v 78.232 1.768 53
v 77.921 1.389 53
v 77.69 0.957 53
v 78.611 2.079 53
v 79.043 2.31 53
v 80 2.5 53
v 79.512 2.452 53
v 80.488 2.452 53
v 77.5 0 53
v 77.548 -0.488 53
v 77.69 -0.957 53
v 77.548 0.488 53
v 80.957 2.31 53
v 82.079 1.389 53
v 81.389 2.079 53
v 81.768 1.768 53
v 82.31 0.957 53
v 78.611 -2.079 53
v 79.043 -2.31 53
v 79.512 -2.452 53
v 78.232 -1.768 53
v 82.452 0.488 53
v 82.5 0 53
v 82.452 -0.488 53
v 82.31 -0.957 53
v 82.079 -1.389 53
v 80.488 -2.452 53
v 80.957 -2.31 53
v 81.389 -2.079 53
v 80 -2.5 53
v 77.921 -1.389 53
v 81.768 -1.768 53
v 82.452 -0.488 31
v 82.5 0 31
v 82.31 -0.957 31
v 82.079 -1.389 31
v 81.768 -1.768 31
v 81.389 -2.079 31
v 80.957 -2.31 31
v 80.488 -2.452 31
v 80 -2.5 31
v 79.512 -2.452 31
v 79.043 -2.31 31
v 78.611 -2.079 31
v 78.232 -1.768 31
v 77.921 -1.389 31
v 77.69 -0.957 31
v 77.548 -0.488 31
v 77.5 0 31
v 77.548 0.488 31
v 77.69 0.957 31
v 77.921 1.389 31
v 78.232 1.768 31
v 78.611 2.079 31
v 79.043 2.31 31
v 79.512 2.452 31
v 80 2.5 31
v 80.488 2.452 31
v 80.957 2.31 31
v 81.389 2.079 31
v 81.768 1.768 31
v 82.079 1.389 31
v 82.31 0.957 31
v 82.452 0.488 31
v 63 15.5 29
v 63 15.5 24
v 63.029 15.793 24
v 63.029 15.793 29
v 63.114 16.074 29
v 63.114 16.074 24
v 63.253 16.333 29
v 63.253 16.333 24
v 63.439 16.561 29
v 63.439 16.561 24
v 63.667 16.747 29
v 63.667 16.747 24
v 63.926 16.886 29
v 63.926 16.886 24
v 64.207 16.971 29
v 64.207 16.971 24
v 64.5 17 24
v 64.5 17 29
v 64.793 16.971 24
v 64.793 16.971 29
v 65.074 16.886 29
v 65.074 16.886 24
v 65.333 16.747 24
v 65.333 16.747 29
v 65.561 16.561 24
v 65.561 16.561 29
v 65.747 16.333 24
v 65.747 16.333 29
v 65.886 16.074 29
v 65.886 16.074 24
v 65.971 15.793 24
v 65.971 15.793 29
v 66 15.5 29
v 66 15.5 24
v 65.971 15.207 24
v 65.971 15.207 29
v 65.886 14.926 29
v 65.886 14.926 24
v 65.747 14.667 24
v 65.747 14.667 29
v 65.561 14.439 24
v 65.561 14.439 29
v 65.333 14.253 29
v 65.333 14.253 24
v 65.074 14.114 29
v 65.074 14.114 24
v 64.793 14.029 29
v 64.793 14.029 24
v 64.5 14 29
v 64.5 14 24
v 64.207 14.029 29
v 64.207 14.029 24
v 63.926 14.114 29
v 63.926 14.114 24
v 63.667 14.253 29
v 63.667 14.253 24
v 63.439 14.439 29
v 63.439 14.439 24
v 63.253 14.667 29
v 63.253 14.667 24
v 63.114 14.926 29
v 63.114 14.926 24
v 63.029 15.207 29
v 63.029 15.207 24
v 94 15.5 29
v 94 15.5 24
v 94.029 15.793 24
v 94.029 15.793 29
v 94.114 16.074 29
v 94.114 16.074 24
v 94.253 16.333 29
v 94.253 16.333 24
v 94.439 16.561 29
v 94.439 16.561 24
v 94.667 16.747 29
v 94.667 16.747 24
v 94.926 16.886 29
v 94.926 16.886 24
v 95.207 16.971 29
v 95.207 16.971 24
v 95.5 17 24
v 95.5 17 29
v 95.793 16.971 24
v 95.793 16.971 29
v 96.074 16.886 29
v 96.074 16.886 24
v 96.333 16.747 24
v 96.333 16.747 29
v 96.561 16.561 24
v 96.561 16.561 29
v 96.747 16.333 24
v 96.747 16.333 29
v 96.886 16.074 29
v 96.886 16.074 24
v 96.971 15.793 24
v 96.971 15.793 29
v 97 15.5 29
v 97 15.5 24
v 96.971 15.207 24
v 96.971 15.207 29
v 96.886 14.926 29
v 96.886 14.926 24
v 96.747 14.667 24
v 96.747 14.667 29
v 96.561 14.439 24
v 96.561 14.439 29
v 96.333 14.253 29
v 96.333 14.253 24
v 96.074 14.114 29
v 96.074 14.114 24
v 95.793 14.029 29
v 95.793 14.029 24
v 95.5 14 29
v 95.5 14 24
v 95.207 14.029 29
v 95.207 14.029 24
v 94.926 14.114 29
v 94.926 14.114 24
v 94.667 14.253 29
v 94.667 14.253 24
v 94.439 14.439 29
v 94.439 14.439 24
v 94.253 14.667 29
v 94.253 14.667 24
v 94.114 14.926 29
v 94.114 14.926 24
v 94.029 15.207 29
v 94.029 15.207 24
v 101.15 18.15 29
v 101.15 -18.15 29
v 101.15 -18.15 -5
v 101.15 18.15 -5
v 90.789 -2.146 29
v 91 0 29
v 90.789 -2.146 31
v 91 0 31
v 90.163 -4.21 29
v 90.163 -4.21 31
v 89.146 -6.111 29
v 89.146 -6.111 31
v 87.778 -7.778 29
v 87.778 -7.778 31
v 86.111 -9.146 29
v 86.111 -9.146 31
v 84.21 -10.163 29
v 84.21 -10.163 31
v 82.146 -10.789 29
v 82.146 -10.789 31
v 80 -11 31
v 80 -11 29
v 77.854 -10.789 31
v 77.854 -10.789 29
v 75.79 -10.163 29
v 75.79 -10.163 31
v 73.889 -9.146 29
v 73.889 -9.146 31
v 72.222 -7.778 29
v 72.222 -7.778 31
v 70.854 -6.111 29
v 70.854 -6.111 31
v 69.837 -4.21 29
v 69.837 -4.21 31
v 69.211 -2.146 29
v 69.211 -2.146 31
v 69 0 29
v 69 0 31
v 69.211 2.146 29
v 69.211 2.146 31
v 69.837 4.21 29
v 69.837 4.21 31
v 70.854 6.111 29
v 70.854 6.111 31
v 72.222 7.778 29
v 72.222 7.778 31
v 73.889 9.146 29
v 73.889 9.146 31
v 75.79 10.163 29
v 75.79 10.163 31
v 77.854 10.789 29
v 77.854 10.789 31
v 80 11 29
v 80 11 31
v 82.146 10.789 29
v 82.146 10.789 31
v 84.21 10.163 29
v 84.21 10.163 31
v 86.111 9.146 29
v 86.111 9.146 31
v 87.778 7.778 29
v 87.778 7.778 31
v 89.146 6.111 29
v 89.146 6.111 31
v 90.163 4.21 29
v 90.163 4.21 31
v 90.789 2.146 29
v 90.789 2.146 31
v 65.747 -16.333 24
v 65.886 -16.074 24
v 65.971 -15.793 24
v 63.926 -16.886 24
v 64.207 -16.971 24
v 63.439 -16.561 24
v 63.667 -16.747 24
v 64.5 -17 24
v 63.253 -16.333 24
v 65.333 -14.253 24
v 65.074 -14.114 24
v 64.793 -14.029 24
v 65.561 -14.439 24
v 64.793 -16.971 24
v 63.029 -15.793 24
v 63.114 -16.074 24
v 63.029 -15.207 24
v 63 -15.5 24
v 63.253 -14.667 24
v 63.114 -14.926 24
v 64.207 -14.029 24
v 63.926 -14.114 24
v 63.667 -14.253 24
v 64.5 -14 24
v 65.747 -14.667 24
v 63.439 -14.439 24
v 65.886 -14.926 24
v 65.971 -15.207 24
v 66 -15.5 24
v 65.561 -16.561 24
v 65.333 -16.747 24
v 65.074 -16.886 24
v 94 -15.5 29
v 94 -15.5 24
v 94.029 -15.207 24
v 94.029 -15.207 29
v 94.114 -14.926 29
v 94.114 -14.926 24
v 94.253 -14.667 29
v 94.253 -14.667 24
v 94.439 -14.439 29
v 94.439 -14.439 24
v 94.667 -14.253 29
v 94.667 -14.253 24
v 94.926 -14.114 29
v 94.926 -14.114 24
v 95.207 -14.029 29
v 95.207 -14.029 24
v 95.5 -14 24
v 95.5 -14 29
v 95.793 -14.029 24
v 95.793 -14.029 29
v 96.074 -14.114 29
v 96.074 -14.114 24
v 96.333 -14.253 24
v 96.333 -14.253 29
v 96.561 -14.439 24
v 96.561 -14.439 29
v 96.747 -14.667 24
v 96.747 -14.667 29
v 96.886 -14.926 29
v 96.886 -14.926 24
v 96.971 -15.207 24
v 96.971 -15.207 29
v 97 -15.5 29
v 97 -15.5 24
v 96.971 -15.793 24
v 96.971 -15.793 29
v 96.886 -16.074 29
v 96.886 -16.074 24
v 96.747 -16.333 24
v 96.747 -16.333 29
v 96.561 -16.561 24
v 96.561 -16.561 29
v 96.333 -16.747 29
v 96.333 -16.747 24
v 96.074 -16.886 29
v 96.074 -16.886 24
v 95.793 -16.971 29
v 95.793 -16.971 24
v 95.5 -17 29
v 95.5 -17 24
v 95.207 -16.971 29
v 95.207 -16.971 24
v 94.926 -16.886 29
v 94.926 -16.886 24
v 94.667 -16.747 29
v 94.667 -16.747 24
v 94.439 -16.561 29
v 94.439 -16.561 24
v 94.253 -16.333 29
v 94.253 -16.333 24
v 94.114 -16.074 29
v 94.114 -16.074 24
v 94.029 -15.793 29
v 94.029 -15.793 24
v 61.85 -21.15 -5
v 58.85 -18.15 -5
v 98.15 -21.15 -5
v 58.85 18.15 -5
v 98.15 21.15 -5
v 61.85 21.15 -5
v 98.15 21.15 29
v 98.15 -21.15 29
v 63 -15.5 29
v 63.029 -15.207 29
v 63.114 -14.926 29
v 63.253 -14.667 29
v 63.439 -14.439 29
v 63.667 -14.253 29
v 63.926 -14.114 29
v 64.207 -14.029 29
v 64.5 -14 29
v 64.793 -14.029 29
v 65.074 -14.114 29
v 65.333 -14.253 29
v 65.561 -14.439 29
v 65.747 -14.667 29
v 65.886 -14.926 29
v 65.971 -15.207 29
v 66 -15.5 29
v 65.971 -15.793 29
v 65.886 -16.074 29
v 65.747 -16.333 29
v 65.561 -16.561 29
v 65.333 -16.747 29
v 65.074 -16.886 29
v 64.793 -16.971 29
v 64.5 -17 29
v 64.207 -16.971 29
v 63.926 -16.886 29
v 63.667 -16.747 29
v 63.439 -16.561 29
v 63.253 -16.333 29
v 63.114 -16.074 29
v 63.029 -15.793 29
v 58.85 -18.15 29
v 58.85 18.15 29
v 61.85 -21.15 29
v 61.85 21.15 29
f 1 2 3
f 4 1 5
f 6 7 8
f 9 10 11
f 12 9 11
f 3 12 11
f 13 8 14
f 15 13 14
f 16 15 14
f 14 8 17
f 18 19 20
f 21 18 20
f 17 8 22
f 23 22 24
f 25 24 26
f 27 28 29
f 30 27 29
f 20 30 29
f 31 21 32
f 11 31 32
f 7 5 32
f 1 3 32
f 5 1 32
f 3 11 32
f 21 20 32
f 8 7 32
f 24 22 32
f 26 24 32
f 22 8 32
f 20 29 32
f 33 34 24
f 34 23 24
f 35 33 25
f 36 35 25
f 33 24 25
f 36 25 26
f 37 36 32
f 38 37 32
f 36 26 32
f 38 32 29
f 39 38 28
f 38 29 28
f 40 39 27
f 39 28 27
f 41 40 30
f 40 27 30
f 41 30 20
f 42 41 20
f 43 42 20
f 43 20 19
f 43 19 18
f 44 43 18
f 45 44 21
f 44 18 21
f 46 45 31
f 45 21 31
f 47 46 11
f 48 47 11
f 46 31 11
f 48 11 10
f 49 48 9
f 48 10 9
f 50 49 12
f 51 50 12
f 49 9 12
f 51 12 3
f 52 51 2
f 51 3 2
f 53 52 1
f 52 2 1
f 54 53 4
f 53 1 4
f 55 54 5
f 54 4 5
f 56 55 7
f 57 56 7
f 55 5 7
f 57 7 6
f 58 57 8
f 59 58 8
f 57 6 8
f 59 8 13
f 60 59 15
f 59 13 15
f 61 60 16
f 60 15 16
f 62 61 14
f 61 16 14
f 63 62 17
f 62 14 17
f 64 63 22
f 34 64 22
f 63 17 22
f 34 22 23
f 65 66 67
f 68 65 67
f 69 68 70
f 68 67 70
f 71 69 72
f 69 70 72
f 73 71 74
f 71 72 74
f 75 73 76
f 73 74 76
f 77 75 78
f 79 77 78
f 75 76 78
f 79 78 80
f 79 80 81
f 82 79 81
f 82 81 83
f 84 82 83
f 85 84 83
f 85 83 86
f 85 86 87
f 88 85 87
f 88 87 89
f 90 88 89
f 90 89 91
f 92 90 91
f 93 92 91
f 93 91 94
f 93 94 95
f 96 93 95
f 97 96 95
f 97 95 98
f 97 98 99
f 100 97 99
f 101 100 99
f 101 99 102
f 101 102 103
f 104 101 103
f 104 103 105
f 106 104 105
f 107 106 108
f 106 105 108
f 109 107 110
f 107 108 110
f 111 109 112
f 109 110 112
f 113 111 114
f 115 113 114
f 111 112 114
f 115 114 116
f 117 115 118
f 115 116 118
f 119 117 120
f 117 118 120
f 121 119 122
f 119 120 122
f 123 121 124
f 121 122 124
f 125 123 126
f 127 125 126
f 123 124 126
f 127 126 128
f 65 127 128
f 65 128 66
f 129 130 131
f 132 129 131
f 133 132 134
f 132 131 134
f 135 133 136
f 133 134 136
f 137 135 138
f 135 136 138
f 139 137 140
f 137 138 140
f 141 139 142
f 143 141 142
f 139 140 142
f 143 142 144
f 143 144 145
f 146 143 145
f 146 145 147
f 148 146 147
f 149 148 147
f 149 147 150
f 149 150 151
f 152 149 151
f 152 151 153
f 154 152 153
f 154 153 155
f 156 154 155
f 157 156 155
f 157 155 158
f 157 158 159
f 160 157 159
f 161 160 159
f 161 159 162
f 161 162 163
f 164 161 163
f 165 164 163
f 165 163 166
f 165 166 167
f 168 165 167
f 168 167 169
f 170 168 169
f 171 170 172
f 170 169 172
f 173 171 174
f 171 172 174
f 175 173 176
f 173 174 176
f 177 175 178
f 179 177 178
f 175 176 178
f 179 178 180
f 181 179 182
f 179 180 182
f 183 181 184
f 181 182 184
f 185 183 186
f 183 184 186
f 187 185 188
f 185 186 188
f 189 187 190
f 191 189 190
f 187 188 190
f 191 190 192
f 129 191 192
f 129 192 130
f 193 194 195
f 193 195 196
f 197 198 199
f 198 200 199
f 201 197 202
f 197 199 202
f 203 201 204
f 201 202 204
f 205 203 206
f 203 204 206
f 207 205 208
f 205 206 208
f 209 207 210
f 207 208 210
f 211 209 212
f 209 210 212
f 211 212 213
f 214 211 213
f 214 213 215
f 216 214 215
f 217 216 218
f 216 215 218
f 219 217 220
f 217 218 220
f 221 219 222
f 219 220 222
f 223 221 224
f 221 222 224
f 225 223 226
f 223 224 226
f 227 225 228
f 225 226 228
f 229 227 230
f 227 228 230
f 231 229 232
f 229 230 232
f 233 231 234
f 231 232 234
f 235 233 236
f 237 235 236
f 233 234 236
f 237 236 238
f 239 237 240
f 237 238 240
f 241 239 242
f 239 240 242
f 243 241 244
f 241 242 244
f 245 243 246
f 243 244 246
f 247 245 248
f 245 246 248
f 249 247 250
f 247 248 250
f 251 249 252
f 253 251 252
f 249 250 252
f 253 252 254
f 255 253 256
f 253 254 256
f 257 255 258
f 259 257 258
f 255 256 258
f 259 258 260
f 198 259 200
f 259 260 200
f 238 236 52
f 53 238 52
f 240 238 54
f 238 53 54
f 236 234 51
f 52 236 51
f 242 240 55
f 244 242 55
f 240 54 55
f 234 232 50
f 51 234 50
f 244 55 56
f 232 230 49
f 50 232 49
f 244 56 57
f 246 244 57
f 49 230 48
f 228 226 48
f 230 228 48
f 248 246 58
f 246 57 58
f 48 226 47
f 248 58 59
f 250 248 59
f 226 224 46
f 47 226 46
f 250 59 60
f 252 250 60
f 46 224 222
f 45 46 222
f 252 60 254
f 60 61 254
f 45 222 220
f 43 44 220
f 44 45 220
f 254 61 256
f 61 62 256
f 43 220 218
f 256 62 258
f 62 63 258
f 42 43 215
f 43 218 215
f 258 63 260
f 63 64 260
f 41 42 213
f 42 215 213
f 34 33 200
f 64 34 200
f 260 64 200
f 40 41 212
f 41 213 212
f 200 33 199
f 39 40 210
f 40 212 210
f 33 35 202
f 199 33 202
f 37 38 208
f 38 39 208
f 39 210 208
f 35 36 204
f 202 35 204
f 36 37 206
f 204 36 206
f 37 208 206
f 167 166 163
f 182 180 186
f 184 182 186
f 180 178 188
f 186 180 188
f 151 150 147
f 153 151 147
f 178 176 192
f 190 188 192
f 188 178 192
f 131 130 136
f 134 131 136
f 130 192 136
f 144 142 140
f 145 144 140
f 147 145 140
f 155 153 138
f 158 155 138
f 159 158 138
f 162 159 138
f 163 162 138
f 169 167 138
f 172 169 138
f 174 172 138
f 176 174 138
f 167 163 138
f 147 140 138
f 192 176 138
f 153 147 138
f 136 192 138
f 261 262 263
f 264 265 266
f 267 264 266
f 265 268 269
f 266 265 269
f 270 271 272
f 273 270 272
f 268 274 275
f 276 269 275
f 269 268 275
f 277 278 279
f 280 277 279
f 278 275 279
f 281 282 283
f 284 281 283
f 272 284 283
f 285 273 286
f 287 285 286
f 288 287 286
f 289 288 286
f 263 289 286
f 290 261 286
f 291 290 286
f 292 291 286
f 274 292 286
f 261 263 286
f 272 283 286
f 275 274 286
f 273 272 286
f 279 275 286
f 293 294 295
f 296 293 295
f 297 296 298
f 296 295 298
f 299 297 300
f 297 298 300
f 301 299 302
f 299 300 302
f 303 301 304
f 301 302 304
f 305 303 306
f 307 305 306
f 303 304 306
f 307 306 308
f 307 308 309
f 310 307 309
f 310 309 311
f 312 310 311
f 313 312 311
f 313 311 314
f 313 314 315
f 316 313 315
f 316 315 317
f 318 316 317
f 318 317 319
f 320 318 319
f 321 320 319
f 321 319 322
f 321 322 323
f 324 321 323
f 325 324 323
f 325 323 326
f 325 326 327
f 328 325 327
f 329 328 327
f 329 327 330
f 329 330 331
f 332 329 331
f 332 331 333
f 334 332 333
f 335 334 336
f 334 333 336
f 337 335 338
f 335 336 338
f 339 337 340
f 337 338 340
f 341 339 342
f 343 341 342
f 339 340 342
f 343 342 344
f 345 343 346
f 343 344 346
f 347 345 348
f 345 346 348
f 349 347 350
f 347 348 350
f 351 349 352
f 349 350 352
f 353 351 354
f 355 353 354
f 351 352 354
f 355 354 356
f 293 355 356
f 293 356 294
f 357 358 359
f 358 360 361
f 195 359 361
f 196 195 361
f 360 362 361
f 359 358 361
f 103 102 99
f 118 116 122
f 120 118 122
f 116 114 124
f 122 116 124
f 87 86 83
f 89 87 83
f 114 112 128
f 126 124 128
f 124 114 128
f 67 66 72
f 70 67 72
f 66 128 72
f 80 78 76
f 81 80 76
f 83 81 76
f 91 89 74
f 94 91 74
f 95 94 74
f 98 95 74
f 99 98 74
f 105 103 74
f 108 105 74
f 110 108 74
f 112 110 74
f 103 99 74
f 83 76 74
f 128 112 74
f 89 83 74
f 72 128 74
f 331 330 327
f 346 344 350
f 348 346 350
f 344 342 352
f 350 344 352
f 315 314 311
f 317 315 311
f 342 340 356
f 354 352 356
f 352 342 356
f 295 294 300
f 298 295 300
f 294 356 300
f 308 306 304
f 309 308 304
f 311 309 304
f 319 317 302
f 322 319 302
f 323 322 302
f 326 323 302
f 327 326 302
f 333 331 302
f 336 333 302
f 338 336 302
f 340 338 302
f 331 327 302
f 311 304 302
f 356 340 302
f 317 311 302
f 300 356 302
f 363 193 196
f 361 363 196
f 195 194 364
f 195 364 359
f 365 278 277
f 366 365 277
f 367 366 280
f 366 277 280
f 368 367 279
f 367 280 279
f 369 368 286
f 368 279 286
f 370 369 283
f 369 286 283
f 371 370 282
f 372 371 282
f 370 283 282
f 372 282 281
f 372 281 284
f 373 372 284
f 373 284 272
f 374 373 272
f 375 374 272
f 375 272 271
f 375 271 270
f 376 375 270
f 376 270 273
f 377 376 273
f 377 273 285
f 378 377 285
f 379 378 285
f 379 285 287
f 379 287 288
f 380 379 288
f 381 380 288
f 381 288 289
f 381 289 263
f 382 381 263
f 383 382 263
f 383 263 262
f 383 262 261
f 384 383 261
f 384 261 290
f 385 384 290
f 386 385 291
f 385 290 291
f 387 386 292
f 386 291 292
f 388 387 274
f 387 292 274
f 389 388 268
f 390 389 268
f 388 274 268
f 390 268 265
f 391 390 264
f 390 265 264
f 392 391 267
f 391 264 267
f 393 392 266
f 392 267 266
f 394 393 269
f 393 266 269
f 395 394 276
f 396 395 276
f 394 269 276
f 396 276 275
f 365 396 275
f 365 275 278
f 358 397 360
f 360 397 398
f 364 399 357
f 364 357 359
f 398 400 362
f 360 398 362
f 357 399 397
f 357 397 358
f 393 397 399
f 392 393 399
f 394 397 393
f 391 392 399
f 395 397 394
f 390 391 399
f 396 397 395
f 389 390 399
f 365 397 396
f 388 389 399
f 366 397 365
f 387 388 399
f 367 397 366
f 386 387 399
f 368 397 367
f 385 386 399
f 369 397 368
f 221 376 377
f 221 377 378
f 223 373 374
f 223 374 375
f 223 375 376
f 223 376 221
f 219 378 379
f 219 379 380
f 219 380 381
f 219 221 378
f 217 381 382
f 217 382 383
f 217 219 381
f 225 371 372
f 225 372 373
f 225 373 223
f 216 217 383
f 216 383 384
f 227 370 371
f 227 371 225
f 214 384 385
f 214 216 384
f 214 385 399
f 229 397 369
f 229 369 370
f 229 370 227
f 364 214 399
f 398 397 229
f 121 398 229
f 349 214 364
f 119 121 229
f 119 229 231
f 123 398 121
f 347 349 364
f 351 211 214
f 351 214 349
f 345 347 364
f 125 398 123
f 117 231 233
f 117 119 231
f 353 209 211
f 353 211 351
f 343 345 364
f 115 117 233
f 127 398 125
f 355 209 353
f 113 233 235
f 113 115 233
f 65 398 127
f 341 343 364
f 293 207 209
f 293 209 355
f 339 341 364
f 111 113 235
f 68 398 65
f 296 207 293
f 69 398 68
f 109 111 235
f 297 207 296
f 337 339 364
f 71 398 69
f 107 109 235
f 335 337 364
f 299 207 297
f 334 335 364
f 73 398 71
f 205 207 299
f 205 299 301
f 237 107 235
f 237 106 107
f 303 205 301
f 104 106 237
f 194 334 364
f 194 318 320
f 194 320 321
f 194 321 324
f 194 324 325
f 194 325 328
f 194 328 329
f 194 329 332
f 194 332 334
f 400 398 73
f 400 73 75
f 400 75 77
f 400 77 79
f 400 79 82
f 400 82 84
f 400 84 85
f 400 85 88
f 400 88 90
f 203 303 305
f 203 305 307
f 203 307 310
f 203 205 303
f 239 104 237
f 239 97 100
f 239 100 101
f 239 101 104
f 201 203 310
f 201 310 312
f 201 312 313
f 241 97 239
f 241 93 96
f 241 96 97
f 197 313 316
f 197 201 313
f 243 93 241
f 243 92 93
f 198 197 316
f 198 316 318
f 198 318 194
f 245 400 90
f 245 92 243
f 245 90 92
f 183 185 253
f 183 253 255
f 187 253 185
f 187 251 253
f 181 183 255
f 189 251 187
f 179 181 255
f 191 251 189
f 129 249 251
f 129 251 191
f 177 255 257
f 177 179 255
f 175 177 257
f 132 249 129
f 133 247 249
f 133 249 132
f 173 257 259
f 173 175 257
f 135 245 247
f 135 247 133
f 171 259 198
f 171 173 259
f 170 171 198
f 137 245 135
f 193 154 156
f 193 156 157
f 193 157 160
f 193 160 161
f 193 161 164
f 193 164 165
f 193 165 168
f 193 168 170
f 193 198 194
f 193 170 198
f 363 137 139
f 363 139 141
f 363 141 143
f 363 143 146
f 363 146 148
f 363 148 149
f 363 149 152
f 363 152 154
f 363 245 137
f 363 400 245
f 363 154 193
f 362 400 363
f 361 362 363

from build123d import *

# Parameters (mm, degrees)
SKETCH_1_W                = 42.3
SKETCH_1_H                = 42.3
EXTRUDE_1_DEPTH           = 34
HOLE_WIZARD_3_0_3_1_D     = 3
HOLE_WIZARD_3_0_3_1_DEPTH = 5
CHAMFER_1_SIZE            = 3


with BuildPart() as part:
    # 草图1 → 凸台-拉伸1 (new body)
    with BuildSketch(Plane.XY.offset(29)):
        with Locations((80, 0)):
            Rectangle(SKETCH_1_W, SKETCH_1_H)
    extrude(amount=-EXTRUDE_1_DEPTH)

    # 草图2 → 旋转1 (revolve)
    with BuildSketch(Plane.XZ):
        Polygon((82.5, 53), (80, 53), (80, 29), (91, 29), (91, 31), (82.5, 31), align=None)
    revolve(axis=Axis((80, 0, 53), (0, 0, -1)))

    # Ø3.0 (3) 直径孔1
    with Locations(Plane.XY.offset(29)):
        with Locations((95.5, 15.5), (95.5, -15.5), (64.5, -15.5), (64.5, 15.5)):
            Hole(HOLE_WIZARD_3_0_3_1_D / 2, depth=HOLE_WIZARD_3_0_3_1_DEPTH)

    # 倒角1
    chamfer_1_edges = [part.edges().sort_by_distance(p)[0] for p in [
        (58.85, 21.15, 12),
        (101.15, 21.15, 12),
        (101.15, -21.15, 12),
        (58.85, -21.15, 12),
    ]]
    chamfer(chamfer_1_edges, length=CHAMFER_1_SIZE)


solid = part.part
